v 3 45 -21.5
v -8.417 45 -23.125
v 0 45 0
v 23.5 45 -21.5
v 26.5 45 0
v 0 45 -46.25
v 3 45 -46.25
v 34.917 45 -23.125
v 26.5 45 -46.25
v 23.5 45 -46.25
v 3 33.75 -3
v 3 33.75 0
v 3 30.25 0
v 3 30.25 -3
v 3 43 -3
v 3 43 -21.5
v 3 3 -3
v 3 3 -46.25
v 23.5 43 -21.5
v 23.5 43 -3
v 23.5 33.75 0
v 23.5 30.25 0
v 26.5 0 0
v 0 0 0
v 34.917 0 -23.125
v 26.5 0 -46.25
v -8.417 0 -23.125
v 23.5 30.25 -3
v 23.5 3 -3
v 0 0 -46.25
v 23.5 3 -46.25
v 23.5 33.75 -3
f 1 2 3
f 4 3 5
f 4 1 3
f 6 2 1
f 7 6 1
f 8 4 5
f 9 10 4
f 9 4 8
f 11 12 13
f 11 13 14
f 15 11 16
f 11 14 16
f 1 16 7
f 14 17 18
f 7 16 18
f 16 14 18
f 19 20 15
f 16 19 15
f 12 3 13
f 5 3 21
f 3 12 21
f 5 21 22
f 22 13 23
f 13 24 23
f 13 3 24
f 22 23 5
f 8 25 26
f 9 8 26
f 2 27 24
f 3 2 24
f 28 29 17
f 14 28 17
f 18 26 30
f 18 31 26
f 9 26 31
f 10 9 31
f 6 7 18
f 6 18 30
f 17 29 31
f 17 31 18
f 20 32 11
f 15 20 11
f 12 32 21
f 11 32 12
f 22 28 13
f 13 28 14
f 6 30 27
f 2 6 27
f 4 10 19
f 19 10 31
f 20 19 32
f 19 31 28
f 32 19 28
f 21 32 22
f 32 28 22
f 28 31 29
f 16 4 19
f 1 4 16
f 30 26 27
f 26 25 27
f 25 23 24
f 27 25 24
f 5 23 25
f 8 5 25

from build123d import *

# Parameters (mm, degrees)
BOSS_EXTRUDE1_DEPTH = 45
SKETCH2_W           = 20.5
SKETCH2_H           = 2
BOSS_EXTRUDE2_DEPTH = 18.5
SKETCH3_W           = 20.5
SKETCH3_H           = 3.5
CUT_EXTRUDE1_DEPTH  = 20
SKETCH4_W           = 20.5
SKETCH4_H           = 3
BOSS_EXTRUDE3_DEPTH = 43.25


with BuildPart() as part:
    # Sketch1 → Boss-Extrude1 (new body)
    with BuildSketch(Plane(origin=(0, 0, 0), x_dir=(1, 0, 0), z_dir=(0, 1, 0))):
        Polygon((0, 0), (26.5, 0), (34.916811667, 23.125), (26.5, 46.25), (23.5, 46.25), (23.5, 3), (3, 3), (3, 46.25), (0, 46.25), (-8.416811667, 23.125), align=None)
    extrude(amount=BOSS_EXTRUDE1_DEPTH)

    # Sketch2 → Boss-Extrude2 (add)
    with BuildSketch(Plane(origin=(0, 0, -3), x_dir=(-1, 0, 0), z_dir=(0, 0, -1))):
        with Locations((-13.25, 44)):
            Rectangle(SKETCH2_W, SKETCH2_H)
    extrude(amount=BOSS_EXTRUDE2_DEPTH)

    # Sketch3 → Cut-Extrude1 (cut)
    with BuildSketch(Plane(origin=(0, 0, -3), x_dir=(-1, 0, 0), z_dir=(0, 0, -1))):
        with Locations((-13.25, 32)):
            Rectangle(SKETCH3_W, SKETCH3_H)
    extrude(amount=-CUT_EXTRUDE1_DEPTH, mode=Mode.SUBTRACT)

    # Sketch4 → Boss-Extrude3 (add)
    with BuildSketch(Plane(origin=(0, 0, -3), x_dir=(-1, 0, 0), z_dir=(0, 0, -1))):
        with Locations((-13.25, 1.5)):
            Rectangle(SKETCH4_W, SKETCH4_H)
    extrude(amount=BOSS_EXTRUDE3_DEPTH)


solid = part.part
